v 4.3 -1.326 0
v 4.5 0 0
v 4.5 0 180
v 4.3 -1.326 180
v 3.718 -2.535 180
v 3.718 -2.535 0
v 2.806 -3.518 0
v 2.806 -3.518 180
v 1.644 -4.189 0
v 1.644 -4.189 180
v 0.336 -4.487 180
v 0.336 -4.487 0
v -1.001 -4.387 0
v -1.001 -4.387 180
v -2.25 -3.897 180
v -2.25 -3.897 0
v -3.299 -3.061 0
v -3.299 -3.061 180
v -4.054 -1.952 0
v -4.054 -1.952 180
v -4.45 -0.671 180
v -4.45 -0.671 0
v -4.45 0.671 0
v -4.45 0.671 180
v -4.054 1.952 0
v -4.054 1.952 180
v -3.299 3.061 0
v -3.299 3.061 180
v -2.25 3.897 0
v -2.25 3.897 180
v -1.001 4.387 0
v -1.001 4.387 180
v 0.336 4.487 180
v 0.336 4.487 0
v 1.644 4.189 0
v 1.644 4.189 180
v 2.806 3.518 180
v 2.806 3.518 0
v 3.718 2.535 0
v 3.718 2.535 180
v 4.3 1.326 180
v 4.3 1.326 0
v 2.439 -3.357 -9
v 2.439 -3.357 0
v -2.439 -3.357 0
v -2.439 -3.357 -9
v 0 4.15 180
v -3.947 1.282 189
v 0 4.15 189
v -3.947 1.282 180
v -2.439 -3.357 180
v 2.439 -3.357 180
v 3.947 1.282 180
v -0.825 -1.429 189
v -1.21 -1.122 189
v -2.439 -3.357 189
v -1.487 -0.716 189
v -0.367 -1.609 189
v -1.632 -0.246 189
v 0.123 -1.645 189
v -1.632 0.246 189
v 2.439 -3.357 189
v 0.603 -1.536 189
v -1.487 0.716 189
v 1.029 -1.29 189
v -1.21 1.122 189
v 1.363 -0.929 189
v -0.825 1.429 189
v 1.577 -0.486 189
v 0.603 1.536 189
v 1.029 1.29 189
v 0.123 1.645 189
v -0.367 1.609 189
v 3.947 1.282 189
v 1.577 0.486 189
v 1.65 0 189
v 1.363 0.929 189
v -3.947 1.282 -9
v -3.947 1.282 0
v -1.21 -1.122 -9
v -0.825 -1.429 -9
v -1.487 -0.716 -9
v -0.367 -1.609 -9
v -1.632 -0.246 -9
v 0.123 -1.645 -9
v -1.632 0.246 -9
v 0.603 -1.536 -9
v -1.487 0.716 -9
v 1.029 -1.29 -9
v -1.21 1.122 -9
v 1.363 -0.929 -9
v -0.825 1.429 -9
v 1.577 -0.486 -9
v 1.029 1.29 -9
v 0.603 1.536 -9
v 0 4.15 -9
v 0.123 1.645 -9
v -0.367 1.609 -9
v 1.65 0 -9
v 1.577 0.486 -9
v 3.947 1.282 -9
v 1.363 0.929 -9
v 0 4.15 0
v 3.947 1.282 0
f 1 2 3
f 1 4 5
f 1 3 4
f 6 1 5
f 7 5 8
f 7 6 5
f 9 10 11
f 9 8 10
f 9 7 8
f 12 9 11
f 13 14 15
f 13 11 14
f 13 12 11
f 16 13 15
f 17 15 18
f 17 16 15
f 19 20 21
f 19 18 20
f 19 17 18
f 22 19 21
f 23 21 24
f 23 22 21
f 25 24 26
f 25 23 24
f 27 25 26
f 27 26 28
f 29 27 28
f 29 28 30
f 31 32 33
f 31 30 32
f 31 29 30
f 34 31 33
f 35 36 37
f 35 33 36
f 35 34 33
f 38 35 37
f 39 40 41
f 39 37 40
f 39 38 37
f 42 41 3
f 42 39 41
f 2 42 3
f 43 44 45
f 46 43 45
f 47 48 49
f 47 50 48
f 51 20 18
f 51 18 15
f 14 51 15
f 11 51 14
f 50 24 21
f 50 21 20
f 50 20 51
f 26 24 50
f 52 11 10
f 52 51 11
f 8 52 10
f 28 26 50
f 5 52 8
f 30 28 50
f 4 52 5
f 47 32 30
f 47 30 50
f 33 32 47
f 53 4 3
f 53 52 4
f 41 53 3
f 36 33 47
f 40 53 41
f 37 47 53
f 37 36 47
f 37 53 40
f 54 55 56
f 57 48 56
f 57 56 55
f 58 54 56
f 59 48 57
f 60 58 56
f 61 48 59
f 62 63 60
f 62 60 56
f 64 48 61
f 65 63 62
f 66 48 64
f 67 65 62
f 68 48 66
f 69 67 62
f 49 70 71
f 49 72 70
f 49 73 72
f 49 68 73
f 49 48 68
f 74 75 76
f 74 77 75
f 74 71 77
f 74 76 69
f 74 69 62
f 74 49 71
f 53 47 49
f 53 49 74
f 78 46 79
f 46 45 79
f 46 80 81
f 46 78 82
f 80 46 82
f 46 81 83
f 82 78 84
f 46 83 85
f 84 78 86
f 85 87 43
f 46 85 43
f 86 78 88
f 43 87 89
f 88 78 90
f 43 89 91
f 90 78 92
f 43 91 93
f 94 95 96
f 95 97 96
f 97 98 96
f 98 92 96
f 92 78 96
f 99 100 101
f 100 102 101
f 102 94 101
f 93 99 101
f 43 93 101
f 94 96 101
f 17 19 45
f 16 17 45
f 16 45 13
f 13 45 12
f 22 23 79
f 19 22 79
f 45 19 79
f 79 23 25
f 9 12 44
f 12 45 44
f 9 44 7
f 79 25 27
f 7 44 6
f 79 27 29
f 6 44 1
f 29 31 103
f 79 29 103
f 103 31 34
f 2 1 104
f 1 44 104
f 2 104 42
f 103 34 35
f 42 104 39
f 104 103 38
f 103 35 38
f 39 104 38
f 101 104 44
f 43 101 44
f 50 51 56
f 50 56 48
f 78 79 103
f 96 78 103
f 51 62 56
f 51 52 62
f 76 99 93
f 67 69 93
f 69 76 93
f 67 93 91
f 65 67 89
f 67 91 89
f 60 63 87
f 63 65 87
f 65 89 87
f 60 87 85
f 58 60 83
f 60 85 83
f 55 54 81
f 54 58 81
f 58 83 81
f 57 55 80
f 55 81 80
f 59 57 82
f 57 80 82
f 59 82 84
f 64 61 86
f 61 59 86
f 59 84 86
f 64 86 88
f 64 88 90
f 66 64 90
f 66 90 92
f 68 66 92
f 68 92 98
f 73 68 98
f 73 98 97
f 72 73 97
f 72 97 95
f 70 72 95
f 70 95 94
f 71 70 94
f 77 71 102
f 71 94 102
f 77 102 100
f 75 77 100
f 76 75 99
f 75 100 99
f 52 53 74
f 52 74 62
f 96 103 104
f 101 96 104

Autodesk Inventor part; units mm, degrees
ref_plane "YZ Plane" through (0, 0, 0) normal (1, 0, 0) x (0, 1, 0)
ref_plane "XZ Plane" through (0, 0, 0) normal (0, 1, 0) x (-1, 0, 0)
ref_plane "XY Plane" through (0, 0, 0) normal (0, 0, 1) x (1, 0, 0)
sketch "Skizze1" plane through (0, 0, 0) normal (0, 0, 1) x (1, 0, 0)
  circle A0 centre (0, 0) radius 1.65
  circle A1 centre (0, 0) radius 4.15 construction
  line L0 (0, 4.15) -> (3.9469, 1.2824)
  line L1 (3.9469, 1.2824) -> (2.4393, -3.3574)
  line L2 (2.4393, -3.3574) -> (-2.4393, -3.3574)
  line L3 (-2.4393, -3.3574) -> (-3.9469, 1.2824)
  line L4 (-3.9469, 1.2824) -> (0, 4.15)
  circle A2 centre (0, 0) radius 4.5
  dimension "d1" = 8.3
  dimension "d0" = 3.3
  dimension "d2" = 9
extrude "Extrusion1" add sketch "Skizze1" along normal blind 180 contours L0 L1 L2 L3 L4 | A2
extrude "Extrusion2" add sketch "Skizze1" against normal blind 9 contours L0 L1 L2 L3 L4
extrude "Extrusion3" add sketch "Skizze1" along normal blind 9 from surface at 180 contours L0 L1 L2 L3 L4
properties part number "Rod"
